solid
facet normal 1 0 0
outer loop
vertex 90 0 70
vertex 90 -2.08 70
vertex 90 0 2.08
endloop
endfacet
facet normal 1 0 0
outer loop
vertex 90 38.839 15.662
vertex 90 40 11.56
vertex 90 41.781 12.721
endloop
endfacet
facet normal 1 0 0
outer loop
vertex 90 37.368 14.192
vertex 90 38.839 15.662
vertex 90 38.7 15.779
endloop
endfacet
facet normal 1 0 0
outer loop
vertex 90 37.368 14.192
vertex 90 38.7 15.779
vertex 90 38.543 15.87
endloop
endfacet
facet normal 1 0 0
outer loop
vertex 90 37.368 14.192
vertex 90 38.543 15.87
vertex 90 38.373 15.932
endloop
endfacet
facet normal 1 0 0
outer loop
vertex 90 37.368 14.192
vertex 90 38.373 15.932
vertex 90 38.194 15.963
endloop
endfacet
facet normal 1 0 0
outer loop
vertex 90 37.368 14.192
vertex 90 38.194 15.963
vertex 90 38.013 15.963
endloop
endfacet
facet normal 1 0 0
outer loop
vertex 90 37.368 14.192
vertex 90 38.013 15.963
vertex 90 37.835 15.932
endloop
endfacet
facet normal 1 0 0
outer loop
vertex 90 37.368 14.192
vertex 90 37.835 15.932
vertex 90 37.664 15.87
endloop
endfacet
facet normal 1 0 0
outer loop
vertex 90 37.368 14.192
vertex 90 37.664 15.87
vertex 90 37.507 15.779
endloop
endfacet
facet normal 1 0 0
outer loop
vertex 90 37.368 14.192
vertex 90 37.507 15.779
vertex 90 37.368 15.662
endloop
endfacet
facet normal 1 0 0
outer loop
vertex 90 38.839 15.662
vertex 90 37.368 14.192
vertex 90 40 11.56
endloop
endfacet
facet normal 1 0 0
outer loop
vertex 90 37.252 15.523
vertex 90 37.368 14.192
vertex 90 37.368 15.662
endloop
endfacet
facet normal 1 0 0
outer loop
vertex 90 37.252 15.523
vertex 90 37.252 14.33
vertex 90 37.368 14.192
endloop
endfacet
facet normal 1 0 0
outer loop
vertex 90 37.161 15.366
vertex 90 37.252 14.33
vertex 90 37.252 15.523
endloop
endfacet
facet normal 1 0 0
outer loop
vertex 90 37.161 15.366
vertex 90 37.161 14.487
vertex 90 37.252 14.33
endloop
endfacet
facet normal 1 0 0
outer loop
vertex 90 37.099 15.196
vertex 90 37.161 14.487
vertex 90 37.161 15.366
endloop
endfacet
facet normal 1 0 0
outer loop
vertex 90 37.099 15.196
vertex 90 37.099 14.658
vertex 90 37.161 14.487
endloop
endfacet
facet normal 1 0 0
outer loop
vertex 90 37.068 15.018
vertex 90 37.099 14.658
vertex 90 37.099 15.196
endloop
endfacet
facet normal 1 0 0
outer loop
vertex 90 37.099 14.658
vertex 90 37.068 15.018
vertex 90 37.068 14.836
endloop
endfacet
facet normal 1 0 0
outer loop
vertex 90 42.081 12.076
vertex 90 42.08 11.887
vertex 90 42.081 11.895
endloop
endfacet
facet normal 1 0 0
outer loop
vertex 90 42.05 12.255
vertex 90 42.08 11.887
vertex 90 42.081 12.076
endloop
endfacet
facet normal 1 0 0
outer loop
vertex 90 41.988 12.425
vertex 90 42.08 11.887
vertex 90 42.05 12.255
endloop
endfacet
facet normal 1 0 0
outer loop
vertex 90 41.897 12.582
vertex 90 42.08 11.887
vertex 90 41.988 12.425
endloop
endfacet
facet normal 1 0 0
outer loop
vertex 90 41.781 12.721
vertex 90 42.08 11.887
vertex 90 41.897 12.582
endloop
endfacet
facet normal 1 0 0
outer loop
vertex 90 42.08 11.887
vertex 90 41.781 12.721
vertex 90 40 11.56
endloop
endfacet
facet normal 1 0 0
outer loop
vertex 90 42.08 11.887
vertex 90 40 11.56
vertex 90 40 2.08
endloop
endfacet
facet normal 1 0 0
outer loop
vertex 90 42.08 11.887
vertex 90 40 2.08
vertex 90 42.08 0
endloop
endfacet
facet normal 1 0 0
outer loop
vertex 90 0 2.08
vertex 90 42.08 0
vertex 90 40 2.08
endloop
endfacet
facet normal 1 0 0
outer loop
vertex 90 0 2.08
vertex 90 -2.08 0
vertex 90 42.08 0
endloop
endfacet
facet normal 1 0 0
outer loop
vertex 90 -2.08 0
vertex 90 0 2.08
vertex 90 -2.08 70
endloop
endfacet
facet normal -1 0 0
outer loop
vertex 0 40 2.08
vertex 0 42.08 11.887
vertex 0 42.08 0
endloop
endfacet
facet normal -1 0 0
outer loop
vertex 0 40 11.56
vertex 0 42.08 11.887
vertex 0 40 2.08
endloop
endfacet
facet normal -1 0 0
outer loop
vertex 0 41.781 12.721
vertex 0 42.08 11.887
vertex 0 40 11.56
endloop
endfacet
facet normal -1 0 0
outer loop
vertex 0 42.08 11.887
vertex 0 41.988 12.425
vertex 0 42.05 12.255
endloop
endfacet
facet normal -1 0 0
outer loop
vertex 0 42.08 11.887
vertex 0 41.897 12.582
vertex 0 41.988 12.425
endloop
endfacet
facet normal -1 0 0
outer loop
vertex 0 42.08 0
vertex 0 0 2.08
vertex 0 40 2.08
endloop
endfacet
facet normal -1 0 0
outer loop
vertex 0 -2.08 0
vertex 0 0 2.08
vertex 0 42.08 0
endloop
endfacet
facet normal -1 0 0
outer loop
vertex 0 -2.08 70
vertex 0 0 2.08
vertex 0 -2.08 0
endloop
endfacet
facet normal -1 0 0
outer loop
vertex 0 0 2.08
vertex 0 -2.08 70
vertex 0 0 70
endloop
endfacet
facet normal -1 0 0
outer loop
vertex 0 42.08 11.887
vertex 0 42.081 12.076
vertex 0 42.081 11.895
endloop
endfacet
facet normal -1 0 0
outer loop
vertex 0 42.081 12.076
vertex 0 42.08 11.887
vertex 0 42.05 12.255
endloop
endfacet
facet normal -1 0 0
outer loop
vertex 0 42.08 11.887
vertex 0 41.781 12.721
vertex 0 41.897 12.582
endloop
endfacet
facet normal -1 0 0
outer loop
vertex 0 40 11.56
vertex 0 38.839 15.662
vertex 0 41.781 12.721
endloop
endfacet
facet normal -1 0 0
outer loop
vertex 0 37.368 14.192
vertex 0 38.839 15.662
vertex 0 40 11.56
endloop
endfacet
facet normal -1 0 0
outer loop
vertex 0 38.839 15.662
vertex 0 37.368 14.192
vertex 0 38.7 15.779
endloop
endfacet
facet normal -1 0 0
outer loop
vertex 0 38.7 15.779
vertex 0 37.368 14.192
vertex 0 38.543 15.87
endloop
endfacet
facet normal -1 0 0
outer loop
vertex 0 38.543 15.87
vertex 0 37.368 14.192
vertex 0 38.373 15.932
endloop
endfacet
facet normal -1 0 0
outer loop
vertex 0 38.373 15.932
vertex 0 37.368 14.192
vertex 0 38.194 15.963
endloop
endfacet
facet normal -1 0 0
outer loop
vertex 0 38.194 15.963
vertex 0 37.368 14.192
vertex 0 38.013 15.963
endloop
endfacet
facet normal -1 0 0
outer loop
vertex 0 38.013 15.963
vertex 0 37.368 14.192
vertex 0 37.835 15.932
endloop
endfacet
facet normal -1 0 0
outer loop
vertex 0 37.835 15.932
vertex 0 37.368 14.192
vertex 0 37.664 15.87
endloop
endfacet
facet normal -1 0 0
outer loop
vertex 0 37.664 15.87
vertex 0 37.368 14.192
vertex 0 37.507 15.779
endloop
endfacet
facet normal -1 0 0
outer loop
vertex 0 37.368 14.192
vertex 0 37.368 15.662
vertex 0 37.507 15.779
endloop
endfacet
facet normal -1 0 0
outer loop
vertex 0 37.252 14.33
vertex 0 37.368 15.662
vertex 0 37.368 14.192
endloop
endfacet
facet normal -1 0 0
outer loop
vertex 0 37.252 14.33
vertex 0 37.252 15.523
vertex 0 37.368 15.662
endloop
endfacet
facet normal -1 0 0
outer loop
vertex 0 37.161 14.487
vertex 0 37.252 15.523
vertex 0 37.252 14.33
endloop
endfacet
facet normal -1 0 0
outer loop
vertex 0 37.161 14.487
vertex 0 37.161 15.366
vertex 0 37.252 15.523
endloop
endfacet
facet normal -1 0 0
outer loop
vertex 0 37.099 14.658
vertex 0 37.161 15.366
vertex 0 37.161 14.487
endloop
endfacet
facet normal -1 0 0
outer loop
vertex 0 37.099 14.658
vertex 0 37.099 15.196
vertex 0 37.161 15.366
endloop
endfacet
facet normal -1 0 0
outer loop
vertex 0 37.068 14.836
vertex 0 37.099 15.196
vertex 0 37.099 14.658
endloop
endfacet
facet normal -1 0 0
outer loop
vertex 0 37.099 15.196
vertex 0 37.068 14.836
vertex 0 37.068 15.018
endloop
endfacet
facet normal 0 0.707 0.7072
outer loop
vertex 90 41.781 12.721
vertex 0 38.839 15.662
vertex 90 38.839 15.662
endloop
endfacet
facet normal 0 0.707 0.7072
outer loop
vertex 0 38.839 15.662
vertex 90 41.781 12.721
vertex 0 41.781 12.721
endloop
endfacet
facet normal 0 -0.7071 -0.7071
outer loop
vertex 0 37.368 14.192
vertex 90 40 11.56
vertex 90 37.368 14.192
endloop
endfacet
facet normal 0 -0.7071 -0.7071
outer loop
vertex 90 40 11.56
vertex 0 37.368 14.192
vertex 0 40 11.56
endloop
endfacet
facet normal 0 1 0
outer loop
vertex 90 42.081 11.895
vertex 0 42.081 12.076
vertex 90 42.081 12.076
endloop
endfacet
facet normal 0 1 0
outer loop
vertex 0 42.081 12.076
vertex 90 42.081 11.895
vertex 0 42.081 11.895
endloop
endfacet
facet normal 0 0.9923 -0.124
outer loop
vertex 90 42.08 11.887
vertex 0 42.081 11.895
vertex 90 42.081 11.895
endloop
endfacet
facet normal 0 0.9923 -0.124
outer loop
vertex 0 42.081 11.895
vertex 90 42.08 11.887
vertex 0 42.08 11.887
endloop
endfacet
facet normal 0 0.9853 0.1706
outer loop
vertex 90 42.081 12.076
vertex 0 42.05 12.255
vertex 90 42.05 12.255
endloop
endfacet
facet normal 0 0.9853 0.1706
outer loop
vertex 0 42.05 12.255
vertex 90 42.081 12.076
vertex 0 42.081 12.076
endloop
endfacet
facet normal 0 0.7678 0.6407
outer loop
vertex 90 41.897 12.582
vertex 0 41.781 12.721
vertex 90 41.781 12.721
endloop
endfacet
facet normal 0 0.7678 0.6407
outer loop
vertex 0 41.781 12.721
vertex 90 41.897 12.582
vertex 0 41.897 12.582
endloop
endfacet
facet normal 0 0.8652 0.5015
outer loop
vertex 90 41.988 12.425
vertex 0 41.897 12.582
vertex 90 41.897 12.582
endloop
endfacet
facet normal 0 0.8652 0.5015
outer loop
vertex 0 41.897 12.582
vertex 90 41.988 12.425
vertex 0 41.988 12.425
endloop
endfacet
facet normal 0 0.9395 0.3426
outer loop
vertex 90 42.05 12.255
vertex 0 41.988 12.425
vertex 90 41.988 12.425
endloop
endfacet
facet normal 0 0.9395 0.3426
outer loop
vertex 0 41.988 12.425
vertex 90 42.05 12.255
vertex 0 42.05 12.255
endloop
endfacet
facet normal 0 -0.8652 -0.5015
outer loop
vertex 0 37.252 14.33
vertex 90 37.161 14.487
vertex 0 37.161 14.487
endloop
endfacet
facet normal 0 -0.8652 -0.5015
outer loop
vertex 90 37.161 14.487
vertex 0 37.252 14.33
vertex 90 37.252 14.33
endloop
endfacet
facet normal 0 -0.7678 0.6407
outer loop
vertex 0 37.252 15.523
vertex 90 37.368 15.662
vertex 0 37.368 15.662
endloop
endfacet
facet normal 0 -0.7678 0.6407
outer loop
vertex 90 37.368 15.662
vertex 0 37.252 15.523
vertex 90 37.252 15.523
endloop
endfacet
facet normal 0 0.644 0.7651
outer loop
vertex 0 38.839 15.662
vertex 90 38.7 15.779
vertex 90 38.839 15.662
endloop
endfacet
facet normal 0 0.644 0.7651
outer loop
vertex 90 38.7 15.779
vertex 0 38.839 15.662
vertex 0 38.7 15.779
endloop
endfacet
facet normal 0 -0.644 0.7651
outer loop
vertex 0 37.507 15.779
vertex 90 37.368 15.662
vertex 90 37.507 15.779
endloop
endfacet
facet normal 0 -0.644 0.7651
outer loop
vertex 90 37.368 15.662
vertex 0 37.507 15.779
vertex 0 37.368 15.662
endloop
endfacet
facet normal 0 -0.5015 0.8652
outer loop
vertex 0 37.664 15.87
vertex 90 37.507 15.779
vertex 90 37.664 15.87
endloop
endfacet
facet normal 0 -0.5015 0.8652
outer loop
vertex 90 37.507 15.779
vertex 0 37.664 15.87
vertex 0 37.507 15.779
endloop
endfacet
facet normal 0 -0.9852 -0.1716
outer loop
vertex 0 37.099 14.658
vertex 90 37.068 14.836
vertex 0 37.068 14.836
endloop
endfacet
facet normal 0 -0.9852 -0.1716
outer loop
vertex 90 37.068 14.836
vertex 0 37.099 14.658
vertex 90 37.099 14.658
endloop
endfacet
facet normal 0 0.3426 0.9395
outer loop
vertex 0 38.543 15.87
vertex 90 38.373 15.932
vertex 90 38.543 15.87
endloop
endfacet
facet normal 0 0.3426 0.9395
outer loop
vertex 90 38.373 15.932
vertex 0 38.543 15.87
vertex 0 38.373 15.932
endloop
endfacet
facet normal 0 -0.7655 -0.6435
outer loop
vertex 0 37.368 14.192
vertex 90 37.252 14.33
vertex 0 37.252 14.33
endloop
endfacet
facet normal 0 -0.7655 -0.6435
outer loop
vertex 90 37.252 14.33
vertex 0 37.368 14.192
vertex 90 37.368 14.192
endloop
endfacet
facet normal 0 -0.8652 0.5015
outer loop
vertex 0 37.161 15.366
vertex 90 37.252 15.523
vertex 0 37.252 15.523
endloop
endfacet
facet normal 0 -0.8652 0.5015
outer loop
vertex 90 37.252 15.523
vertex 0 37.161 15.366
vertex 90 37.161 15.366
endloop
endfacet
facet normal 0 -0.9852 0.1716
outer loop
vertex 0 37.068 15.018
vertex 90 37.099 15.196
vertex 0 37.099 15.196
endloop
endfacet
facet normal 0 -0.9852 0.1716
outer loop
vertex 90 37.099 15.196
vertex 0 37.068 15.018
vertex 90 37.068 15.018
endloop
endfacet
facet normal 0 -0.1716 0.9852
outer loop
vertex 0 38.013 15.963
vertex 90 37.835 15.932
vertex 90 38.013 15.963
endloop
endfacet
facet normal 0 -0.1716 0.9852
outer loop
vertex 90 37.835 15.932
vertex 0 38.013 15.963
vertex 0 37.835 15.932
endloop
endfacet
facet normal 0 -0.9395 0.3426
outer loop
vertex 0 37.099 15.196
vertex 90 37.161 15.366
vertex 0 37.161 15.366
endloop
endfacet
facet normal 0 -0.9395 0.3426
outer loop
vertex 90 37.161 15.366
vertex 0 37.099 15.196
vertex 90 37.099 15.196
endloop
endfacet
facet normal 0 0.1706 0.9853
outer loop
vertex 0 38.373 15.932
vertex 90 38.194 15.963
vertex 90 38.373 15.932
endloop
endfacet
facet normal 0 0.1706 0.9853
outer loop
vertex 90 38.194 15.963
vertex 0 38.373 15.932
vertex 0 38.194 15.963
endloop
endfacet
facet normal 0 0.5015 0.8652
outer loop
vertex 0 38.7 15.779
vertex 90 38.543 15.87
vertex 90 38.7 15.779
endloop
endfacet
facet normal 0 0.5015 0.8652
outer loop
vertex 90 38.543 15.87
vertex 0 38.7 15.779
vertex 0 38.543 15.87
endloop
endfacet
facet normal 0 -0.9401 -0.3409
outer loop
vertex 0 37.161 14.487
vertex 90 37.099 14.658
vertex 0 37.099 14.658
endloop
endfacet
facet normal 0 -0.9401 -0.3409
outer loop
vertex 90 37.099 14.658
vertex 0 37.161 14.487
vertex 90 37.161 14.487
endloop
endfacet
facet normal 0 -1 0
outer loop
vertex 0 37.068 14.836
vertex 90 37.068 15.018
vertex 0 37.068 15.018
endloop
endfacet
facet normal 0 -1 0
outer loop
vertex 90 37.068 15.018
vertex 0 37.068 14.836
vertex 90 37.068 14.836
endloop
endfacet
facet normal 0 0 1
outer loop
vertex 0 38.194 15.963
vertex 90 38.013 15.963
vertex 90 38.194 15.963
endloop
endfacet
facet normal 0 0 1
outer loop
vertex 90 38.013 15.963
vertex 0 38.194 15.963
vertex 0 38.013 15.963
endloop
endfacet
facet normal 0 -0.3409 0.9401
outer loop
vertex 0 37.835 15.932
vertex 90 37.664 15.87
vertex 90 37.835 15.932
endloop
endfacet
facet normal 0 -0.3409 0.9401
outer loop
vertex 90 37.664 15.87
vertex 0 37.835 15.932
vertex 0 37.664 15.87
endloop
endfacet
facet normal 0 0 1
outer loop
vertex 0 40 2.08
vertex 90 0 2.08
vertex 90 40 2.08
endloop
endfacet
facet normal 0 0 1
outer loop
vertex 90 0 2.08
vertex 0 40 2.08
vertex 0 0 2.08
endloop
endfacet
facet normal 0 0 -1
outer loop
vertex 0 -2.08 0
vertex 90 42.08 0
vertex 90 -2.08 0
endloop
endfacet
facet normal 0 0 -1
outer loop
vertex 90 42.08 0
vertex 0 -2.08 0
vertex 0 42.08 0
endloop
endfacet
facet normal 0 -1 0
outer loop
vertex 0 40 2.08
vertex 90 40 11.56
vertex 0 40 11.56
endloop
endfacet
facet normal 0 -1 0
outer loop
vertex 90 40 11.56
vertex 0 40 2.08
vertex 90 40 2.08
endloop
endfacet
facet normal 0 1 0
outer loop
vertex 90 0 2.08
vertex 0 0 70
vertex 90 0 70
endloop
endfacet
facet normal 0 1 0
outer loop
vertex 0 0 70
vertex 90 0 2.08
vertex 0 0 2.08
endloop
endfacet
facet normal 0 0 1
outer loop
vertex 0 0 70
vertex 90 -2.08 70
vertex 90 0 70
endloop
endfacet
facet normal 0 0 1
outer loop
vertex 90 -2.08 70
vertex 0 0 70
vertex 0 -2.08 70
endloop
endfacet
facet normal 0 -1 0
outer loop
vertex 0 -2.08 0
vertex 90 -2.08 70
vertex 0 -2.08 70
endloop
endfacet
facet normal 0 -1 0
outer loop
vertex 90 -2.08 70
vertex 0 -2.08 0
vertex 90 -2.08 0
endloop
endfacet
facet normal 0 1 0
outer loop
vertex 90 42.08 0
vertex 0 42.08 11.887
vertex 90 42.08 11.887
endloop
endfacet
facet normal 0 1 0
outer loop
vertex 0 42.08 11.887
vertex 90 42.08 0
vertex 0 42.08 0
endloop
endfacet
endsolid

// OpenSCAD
// Handyholder Klo
$fn=36;

tabletwidthfold4 = 150;

width = (3/5)*tabletwidthfold4;

height = 70;

depth = 40;

front = 10;

t = 2.08;

module a()
{
    cube([width,depth,t]);

    translate([0,-t,0])
    cube([width,t,height]);

    translate([0,depth,0])
    cube([width,t,front+t]);
        
    translate([0,depth+0.31,front+1.25])    
    rotate([45,0,0])
    {
        color("red")
        cube([width,t,t*2]);
        
        translate([0,t/2,0])
        rotate([0,90,0])
        color("green")
        cylinder(h=width,d=t);
        
        translate([0,t/2,t*2])
        rotate([0,90,0])
        color("blue")
        cylinder(h=width,d=t);
    }    
}

module hole() {
    translate([0,-t,0])
rotate([270,0,0])
cylinder(h=t, d1=2, d2=5);
}

module withholes() {
difference()
{
    a();
    
    translate([width/2+20,0,height/2+10])
    hole();
    
    translate([width/2-20,0,height/2+10])
    hole();

}
}

a();
